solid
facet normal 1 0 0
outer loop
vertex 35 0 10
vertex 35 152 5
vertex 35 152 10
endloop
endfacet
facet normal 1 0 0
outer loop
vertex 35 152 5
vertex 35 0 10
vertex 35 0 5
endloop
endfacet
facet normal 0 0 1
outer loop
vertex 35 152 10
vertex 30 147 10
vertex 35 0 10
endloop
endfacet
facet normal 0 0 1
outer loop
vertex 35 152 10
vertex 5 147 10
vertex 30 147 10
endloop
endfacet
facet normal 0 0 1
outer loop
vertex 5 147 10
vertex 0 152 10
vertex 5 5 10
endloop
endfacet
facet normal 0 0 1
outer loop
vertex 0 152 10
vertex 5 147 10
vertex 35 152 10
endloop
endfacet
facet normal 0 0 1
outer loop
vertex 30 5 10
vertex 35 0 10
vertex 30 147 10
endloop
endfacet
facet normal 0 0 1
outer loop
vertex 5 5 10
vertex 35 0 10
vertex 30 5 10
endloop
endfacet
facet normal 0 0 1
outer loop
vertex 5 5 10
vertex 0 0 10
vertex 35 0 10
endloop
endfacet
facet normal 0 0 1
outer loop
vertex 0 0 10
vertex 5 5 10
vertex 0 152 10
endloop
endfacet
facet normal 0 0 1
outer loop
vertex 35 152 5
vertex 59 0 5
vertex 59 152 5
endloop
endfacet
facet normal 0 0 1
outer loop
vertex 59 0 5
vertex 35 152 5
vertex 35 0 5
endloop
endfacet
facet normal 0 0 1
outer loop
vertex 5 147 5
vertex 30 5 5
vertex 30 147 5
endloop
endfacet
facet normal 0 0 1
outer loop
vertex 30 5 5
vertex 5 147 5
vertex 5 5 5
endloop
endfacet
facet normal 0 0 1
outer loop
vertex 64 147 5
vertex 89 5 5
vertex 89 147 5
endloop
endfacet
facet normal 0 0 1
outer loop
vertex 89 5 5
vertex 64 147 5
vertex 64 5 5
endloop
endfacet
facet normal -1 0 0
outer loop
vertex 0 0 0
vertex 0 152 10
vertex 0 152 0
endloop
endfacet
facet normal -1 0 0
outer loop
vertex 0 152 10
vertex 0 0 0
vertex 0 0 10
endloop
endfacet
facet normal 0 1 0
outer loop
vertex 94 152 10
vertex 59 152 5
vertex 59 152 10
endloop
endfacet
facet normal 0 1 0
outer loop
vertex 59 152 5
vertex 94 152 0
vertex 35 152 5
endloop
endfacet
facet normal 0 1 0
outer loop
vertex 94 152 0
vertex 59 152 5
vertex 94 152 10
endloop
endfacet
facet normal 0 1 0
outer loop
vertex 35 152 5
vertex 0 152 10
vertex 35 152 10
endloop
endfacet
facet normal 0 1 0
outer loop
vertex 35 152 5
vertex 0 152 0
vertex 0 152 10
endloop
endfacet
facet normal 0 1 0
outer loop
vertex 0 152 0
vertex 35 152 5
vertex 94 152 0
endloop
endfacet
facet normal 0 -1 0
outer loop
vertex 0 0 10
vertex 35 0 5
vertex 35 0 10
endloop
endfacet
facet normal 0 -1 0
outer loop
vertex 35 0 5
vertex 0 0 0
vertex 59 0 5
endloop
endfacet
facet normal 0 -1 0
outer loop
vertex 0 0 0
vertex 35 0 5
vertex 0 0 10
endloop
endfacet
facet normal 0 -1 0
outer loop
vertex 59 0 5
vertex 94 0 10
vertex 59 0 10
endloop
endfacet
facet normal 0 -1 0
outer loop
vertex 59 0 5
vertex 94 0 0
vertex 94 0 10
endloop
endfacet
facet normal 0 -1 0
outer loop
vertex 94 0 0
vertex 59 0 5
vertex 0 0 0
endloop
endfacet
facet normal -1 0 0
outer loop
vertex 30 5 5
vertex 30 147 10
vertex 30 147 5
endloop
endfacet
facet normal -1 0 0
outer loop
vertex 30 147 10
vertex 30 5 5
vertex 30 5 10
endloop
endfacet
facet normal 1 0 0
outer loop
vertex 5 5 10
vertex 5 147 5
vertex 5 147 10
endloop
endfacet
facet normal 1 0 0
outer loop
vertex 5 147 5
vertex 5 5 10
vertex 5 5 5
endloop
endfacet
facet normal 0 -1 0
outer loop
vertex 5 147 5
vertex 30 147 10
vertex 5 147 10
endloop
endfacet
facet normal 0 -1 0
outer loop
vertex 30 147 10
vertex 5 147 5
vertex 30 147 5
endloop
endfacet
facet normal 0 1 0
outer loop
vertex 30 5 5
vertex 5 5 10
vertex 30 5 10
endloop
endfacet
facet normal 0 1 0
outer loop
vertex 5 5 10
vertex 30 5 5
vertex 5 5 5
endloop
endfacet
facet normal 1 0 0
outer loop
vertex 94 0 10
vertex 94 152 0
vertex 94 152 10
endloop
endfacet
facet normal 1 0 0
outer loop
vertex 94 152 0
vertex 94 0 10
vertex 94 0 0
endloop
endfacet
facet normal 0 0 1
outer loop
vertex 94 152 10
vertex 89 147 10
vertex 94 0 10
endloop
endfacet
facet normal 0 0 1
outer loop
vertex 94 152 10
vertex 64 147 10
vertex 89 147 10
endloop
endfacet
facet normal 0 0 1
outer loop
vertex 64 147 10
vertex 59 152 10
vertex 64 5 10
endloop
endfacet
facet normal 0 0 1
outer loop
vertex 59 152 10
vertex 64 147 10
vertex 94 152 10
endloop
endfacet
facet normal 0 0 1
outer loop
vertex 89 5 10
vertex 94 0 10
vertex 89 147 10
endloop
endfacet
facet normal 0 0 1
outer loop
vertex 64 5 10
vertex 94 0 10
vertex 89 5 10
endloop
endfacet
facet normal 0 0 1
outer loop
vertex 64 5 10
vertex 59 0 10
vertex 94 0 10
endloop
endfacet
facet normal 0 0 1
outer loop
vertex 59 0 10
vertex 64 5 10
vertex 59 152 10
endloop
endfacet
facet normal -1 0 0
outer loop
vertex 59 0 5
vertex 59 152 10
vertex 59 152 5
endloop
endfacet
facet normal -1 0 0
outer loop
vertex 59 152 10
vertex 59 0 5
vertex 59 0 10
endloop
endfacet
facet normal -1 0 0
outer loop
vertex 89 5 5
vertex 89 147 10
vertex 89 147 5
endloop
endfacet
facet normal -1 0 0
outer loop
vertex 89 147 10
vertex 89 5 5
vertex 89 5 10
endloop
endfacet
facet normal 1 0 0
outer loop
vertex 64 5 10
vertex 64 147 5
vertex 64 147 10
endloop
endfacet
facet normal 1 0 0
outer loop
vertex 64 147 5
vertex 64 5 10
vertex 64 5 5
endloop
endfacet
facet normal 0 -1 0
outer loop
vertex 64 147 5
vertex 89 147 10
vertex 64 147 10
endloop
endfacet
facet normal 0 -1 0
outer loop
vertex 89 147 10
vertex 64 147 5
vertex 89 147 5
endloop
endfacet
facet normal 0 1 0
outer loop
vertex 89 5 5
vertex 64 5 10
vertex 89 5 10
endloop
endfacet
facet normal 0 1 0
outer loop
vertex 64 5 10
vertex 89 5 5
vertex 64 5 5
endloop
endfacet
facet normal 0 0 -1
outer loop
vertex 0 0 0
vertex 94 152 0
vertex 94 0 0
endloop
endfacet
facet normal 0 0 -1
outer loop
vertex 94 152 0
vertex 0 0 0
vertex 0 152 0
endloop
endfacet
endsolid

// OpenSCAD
HEIGHT_BASE=5;
HEIGHT_FRAME=5;

LENGTH=142;
WIDTH=84;
TRACK_WIDTH=25;

PADDING = 5;

module track() {
    difference() {
        cube([TRACK_WIDTH + 2 * PADDING, LENGTH + 2 * PADDING, HEIGHT_FRAME]);
        translate([PADDING, PADDING, -1])
        cube([TRACK_WIDTH, LENGTH, HEIGHT_FRAME + 2]);
    }
}

translate([0, 0, HEIGHT_BASE])
track(); 

translate([WIDTH - TRACK_WIDTH, 0, HEIGHT_BASE])
track(); 

cube([WIDTH + 2 * PADDING, LENGTH + 2 * PADDING, HEIGHT_BASE]);
